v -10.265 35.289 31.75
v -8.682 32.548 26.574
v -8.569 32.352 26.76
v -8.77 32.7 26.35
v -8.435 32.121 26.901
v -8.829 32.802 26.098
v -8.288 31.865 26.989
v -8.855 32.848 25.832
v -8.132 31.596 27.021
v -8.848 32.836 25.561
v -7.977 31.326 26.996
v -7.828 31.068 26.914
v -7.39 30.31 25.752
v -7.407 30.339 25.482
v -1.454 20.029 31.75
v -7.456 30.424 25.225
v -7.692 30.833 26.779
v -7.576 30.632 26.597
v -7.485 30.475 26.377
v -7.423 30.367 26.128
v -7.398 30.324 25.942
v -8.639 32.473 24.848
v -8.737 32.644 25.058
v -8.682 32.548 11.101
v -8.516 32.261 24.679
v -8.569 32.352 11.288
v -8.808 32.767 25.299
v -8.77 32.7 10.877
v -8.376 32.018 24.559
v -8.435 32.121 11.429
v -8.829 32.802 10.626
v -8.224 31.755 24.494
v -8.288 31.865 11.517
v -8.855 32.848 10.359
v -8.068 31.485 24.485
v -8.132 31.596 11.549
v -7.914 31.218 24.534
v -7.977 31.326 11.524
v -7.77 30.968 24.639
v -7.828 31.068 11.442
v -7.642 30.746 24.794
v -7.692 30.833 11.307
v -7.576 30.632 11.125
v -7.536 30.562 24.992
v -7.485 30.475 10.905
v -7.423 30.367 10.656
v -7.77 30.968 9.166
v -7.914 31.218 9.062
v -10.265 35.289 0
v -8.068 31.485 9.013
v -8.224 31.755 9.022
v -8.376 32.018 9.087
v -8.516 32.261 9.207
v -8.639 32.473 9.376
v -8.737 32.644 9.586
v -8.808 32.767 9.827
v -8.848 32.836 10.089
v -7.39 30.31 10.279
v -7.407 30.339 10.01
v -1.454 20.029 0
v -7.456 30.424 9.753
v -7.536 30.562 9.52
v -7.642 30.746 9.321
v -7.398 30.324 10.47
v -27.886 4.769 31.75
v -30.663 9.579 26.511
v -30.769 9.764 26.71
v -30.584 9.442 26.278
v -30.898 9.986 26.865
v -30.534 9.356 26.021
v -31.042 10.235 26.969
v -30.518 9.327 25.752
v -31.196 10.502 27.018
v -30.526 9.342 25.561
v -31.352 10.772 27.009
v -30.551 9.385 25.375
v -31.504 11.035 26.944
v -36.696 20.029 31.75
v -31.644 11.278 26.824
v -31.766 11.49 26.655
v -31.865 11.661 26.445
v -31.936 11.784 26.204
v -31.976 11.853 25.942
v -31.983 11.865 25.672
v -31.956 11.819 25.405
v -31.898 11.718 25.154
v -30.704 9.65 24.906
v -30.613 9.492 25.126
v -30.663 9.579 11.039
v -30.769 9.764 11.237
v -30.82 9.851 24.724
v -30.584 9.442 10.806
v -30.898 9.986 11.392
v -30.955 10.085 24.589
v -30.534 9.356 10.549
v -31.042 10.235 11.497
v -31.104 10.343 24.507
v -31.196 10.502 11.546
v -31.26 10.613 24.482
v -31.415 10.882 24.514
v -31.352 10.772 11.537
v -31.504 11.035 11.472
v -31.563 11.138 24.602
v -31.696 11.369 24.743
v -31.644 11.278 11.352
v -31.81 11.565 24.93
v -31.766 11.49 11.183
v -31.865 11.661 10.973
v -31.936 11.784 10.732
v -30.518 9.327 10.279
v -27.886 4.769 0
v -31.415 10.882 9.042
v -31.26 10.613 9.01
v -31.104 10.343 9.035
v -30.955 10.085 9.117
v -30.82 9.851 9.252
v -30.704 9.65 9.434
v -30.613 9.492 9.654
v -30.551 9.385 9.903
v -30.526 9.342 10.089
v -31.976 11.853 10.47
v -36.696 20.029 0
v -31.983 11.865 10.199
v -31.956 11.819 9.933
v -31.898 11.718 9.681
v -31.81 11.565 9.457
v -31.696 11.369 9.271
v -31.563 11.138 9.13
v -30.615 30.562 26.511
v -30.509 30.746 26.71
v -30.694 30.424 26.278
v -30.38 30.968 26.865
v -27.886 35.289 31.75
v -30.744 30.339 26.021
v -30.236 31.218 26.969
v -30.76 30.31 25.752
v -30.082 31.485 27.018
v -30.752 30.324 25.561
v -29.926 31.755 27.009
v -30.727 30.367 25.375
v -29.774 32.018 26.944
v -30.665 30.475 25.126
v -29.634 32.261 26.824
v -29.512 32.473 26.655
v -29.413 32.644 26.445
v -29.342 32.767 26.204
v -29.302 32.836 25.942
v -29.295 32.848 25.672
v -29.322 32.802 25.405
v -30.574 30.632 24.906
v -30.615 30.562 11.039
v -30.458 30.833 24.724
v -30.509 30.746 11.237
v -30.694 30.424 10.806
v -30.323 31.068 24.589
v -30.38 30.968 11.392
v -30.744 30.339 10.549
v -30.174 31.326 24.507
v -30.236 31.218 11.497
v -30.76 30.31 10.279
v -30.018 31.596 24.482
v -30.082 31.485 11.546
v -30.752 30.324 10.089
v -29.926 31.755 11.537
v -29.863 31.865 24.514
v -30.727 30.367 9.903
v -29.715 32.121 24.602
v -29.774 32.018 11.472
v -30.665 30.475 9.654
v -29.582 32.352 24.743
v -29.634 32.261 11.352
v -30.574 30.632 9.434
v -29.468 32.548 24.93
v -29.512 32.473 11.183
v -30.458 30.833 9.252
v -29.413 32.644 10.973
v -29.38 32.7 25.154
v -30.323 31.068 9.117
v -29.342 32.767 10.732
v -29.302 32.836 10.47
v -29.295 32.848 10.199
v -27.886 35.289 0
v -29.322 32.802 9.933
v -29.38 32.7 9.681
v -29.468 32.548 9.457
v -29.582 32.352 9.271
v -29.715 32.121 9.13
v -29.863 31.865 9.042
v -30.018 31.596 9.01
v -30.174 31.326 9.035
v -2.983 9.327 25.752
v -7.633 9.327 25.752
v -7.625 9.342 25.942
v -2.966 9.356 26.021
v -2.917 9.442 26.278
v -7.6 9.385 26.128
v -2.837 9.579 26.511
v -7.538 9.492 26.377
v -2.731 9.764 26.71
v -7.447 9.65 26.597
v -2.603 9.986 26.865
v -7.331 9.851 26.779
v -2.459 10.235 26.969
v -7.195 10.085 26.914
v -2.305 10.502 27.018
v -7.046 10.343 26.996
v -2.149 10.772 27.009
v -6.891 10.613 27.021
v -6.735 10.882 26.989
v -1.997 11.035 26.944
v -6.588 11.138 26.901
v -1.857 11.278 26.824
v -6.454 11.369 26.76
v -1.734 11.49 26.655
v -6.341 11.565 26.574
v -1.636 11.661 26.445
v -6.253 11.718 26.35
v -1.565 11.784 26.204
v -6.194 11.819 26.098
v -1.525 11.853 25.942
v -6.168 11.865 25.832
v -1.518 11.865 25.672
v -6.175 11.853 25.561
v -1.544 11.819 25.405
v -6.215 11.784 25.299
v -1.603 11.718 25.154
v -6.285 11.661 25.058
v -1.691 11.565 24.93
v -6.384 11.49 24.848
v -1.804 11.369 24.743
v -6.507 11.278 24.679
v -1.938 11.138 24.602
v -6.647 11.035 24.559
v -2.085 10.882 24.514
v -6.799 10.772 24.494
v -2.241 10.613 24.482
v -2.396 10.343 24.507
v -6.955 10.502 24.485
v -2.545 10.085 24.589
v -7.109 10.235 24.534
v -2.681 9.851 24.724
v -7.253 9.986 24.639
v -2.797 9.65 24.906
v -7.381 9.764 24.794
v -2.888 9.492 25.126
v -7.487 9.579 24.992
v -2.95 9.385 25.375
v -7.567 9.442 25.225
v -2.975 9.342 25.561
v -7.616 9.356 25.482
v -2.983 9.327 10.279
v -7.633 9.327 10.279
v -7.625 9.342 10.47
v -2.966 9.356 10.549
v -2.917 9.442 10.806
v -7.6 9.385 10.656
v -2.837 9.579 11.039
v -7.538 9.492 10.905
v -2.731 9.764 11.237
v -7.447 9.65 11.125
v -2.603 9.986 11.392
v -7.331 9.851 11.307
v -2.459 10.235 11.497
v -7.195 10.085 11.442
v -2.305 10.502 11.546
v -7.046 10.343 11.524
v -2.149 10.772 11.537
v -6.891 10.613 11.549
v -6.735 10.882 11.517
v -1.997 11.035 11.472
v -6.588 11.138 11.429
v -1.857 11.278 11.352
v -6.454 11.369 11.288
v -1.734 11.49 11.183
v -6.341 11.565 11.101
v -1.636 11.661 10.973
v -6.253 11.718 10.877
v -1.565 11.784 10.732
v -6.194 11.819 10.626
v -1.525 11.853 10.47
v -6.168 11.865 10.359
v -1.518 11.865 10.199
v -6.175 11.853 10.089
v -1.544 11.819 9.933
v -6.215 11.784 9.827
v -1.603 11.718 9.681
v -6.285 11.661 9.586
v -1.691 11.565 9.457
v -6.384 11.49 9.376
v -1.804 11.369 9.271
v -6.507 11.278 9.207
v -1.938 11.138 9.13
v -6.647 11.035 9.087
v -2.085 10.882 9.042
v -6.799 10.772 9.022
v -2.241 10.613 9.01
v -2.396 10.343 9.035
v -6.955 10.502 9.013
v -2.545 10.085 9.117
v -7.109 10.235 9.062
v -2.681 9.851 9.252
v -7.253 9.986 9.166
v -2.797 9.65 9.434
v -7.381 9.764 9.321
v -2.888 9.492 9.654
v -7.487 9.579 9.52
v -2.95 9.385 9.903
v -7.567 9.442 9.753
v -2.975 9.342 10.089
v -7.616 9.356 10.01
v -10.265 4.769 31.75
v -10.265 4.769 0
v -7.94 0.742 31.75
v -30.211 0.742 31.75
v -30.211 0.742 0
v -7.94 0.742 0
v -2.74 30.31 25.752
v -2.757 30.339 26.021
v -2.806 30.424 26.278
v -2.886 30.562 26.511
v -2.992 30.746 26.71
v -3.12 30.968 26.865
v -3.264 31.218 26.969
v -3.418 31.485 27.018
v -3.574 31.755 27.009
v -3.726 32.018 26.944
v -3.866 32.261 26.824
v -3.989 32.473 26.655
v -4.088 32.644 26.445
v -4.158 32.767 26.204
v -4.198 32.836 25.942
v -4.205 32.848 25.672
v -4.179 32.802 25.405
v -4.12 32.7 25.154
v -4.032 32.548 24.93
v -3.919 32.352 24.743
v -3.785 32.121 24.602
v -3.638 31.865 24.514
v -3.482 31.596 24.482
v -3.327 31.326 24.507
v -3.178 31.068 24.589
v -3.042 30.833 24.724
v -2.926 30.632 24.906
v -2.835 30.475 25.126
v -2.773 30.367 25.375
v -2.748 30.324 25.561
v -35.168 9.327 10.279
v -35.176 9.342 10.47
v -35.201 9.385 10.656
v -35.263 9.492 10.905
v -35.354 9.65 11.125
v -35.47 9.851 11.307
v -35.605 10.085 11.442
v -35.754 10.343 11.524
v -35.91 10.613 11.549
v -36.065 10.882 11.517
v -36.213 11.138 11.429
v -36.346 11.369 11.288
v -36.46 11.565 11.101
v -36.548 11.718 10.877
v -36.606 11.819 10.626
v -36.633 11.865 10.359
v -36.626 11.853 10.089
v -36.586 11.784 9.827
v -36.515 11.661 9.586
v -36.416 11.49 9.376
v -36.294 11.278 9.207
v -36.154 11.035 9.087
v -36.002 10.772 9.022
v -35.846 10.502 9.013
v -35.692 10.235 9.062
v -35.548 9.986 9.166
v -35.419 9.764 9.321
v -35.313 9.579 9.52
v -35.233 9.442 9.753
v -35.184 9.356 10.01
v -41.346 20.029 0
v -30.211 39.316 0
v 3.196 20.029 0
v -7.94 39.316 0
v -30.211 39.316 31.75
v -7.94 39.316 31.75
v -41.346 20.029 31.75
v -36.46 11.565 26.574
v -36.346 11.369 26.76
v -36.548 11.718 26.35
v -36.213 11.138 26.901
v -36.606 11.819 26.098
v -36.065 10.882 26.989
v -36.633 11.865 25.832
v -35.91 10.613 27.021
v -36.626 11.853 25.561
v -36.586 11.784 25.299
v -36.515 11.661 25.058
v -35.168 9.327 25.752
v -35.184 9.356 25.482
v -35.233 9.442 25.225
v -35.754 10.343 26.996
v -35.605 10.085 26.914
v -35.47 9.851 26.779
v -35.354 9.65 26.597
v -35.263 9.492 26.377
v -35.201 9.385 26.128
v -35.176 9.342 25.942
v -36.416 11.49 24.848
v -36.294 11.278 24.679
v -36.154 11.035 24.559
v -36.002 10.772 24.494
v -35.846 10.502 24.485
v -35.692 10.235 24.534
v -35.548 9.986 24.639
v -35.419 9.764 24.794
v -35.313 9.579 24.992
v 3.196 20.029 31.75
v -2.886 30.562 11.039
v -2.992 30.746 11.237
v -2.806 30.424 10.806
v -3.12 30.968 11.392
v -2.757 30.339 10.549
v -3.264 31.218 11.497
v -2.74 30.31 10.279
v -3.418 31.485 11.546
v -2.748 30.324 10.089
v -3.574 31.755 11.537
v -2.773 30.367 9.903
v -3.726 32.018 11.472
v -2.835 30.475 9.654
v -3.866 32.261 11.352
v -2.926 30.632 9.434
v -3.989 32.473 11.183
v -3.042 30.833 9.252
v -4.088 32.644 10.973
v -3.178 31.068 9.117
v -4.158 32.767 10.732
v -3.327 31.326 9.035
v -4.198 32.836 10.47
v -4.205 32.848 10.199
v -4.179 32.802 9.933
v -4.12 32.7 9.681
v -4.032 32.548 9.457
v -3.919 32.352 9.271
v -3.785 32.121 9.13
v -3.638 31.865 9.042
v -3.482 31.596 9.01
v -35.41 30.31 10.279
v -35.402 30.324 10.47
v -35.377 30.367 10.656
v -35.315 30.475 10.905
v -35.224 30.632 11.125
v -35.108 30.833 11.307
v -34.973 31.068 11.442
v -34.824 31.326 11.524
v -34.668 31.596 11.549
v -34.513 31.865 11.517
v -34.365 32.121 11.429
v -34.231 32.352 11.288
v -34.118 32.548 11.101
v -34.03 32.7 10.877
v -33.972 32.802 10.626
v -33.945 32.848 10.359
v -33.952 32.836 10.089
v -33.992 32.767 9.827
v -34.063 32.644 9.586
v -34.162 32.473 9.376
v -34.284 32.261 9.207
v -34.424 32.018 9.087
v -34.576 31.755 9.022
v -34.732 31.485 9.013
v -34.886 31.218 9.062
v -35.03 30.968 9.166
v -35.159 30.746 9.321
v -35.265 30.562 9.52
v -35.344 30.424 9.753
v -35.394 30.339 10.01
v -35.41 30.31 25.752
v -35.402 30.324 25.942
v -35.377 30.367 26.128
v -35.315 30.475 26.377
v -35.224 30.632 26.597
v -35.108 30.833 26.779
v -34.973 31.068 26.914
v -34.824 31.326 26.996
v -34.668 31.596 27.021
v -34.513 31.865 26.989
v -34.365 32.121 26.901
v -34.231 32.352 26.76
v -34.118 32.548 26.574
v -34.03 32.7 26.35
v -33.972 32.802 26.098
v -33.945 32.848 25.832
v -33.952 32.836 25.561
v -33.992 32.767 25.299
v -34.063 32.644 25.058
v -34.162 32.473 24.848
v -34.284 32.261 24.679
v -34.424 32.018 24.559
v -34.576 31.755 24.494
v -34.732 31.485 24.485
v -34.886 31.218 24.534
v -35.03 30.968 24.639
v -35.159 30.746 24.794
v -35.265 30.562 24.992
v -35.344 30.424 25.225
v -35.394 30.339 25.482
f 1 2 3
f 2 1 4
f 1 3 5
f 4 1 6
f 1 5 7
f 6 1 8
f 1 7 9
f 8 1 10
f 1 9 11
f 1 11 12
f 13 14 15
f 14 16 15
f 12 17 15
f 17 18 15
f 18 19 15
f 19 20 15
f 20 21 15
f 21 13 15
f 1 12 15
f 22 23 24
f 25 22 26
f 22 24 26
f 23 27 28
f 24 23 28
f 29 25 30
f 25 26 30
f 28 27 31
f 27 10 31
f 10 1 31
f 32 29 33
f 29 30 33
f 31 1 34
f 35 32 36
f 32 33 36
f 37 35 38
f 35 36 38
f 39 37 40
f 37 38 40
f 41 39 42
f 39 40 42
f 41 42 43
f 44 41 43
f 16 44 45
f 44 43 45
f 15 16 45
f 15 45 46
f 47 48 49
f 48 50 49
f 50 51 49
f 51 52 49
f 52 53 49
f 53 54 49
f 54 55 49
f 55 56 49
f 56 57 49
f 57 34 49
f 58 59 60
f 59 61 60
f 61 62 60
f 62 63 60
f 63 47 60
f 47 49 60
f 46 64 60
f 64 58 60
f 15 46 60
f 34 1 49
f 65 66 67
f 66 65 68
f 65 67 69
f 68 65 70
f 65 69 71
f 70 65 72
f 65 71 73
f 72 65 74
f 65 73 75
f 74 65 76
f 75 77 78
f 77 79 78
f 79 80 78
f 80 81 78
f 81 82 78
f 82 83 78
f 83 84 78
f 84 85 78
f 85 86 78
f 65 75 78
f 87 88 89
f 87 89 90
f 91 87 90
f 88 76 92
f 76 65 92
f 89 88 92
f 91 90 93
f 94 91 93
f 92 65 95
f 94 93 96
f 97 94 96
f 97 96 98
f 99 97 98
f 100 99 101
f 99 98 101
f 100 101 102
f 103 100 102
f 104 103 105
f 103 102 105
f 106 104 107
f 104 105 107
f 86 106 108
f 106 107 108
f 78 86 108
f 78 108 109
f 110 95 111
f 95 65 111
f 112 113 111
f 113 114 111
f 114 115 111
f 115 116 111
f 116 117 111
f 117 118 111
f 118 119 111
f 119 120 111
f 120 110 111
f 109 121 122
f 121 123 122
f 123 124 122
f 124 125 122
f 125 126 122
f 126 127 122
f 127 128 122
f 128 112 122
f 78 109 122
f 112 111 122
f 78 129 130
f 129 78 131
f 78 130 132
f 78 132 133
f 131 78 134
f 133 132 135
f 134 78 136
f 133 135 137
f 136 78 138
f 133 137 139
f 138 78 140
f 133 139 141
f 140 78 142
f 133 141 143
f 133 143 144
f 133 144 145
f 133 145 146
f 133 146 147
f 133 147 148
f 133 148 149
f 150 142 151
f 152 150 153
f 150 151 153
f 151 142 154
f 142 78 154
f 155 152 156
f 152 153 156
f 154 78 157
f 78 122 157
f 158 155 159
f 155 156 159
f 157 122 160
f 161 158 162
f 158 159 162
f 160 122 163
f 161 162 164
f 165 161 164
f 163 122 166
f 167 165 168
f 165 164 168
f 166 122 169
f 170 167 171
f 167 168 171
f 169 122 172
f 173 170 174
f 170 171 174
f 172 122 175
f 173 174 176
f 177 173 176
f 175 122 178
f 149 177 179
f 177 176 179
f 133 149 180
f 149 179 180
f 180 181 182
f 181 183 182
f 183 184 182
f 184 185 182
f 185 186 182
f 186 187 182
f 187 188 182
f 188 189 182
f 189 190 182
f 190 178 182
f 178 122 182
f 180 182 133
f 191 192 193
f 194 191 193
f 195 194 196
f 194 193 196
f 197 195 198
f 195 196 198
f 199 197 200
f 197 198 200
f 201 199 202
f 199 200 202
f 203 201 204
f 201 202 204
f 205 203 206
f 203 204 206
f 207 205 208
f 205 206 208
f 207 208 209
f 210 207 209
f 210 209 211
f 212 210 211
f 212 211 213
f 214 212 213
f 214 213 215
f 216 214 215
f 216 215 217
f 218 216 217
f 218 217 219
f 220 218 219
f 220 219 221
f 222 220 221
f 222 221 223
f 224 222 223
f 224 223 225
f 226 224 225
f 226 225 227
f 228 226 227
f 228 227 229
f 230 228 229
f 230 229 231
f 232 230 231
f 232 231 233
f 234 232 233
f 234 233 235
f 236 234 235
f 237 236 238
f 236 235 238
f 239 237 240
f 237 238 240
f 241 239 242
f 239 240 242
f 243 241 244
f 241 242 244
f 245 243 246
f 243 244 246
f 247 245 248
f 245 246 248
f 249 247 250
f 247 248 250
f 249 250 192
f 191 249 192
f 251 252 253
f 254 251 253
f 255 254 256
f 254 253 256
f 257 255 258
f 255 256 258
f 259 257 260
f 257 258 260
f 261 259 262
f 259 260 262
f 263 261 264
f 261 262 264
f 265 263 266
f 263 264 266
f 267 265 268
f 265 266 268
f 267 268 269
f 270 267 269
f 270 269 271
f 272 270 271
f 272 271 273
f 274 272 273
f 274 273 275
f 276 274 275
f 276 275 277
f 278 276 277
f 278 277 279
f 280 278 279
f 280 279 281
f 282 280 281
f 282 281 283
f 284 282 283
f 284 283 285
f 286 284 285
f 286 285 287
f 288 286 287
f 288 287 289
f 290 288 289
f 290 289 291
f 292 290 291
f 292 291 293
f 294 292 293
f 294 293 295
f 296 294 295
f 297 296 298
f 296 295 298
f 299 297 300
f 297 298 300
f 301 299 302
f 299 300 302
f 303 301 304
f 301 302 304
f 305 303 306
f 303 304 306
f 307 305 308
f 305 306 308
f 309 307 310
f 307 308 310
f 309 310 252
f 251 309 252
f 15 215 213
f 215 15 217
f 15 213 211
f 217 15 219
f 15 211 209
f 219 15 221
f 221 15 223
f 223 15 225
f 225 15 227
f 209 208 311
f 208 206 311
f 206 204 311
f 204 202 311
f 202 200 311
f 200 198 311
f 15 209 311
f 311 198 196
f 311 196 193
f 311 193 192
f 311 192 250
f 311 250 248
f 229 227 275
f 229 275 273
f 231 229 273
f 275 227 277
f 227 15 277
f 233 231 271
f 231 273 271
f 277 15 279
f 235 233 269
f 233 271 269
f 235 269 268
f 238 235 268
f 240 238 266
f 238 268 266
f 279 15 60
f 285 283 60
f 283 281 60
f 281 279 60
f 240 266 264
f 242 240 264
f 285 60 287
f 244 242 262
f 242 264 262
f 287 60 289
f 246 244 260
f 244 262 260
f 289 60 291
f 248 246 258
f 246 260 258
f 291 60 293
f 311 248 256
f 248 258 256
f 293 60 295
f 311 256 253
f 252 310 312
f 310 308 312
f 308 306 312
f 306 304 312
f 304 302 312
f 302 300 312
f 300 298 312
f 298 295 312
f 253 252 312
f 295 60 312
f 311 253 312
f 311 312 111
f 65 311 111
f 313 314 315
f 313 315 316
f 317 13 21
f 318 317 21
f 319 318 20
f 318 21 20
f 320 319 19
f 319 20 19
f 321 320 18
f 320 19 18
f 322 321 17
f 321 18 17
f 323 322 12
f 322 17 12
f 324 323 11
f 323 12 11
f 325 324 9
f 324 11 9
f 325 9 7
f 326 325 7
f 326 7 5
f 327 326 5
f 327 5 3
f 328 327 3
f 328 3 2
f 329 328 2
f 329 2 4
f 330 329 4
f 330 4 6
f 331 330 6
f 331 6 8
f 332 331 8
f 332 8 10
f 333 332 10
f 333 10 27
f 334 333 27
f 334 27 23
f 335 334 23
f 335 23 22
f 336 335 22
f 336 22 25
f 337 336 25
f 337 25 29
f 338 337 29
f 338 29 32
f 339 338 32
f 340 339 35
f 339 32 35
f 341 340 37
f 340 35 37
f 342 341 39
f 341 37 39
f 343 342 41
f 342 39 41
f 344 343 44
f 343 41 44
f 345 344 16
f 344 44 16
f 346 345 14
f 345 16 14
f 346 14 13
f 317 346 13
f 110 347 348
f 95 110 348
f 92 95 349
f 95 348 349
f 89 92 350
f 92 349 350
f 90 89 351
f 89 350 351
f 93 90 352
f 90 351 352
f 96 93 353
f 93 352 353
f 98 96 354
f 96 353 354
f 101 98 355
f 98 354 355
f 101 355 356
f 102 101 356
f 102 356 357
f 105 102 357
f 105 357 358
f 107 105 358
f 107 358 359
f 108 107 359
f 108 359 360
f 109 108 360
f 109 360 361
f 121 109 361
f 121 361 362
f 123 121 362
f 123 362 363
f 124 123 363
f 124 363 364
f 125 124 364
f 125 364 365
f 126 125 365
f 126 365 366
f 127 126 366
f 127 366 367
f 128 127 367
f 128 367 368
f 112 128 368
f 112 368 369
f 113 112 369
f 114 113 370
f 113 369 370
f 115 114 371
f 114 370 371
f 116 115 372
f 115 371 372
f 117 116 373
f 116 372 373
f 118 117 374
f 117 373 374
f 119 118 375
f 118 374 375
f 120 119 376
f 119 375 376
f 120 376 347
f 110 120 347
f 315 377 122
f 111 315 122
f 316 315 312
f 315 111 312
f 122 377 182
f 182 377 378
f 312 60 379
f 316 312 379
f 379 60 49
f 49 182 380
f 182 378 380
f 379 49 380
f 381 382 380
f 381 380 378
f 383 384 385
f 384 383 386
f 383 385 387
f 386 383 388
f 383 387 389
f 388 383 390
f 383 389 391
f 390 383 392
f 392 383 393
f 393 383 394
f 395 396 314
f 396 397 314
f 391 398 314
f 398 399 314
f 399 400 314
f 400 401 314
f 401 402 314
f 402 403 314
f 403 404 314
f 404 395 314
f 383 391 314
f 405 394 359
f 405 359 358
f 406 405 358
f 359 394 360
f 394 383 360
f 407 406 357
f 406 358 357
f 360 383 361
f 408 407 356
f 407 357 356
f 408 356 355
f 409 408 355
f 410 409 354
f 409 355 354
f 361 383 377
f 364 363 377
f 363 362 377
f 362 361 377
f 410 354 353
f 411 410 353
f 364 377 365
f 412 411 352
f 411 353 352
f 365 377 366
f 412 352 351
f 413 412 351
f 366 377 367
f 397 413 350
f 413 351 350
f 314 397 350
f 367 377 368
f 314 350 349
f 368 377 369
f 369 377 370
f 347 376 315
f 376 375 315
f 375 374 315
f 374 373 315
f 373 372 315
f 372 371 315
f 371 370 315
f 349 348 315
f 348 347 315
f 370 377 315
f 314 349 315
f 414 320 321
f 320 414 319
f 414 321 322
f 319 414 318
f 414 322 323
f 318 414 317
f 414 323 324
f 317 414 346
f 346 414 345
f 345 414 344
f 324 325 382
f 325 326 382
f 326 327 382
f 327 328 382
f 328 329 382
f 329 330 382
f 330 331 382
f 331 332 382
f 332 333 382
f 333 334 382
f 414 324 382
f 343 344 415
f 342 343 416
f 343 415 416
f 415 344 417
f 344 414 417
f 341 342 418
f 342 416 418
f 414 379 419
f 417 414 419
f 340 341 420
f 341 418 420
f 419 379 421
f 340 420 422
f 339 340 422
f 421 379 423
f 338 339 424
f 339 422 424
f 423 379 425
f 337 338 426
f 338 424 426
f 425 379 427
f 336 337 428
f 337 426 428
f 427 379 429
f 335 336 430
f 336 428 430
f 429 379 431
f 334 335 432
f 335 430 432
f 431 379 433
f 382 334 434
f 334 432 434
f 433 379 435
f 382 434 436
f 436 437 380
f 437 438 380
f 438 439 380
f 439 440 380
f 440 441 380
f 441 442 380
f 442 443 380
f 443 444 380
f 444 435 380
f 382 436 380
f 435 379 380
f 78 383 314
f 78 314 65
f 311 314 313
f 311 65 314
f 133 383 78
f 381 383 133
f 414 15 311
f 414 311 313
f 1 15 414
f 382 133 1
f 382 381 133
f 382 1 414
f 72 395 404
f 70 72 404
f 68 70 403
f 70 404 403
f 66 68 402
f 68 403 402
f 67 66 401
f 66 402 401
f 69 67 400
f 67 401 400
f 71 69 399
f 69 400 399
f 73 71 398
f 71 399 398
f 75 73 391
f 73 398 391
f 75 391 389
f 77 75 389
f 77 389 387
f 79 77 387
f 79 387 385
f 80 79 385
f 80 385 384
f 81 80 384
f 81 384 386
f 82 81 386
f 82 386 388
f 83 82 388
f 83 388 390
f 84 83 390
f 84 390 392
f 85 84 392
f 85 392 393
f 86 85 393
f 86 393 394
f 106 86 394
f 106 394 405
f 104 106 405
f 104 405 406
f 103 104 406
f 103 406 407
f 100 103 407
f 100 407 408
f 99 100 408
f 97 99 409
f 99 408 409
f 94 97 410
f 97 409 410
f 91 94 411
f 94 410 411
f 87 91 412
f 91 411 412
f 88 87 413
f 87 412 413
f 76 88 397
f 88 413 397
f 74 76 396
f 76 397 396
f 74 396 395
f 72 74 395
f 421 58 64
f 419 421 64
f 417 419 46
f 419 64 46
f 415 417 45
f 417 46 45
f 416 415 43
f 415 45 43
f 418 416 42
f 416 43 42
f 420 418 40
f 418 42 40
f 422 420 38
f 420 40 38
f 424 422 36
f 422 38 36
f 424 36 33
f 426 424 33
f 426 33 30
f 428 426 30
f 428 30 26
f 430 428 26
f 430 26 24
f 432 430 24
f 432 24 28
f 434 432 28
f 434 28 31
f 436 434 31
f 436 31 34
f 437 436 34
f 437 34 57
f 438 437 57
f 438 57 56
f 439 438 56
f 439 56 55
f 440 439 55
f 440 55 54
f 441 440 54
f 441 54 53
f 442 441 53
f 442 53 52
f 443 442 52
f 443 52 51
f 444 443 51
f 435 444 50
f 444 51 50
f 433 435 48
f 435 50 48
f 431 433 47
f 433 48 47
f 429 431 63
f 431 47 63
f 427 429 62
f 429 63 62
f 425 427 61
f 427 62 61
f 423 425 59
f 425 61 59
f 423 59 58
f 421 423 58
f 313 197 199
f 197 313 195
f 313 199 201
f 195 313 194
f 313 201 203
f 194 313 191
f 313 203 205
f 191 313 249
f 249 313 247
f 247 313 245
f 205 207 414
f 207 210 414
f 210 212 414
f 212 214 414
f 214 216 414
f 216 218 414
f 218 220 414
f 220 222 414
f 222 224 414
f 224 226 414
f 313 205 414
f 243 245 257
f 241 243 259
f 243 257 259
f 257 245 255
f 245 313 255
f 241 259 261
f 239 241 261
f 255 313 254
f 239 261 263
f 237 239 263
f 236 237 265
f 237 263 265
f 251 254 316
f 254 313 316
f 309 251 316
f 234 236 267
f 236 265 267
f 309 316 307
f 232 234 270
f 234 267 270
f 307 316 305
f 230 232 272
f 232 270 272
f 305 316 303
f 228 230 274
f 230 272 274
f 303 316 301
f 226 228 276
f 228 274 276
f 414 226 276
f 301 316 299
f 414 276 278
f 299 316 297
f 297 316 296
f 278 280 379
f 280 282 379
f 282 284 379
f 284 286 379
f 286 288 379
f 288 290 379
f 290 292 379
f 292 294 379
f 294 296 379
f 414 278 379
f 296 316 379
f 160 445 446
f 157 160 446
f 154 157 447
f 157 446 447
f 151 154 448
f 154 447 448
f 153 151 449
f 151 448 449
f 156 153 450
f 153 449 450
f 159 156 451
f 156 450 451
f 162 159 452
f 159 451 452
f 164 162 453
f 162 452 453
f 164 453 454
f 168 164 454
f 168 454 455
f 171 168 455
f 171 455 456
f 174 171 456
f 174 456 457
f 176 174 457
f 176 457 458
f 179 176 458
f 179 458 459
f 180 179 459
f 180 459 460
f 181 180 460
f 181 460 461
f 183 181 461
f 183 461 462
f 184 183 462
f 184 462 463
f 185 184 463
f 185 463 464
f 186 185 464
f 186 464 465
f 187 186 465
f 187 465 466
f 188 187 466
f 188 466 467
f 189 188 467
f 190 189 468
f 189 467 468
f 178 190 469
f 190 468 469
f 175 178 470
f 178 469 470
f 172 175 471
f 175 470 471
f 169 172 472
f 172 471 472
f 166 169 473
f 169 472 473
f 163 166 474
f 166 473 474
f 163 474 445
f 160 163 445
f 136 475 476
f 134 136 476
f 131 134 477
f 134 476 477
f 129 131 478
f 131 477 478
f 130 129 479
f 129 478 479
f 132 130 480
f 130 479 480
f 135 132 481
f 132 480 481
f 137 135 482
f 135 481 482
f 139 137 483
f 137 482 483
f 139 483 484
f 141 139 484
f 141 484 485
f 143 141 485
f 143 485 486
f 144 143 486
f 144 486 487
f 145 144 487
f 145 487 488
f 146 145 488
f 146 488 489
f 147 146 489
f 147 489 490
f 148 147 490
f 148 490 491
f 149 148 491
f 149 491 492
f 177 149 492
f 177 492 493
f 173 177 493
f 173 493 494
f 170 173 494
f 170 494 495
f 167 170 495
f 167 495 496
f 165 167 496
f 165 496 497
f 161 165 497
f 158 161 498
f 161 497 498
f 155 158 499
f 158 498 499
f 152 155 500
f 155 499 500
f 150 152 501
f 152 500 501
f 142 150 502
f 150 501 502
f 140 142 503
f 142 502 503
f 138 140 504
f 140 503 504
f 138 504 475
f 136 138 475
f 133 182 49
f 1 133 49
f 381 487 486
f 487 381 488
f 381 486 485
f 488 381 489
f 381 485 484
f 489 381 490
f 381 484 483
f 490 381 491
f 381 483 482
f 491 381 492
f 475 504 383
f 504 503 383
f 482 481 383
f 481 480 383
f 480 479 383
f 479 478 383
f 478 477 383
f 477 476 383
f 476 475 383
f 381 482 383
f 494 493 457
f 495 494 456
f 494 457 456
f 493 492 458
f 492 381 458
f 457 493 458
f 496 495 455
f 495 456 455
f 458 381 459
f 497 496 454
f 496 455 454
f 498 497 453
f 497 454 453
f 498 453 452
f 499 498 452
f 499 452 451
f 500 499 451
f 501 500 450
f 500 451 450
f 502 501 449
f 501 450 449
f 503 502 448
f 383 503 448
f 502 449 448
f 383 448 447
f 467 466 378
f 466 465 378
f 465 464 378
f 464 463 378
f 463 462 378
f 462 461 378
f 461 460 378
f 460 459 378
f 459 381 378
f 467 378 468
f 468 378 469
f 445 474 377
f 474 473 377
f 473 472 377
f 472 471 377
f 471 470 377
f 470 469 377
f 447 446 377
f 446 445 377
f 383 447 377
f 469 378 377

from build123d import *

# Parameters (mm, degrees)
F1_DEPTH = 31.75
F3_D     = 2.54


with BuildPart() as f1:
    # F0 (on Top) → F1 (new body)
    with BuildSketch(Plane.XY):
        Polygon((-7.939773, 39.316174), (-30.21069, 39.316174), (-41.346149, 20.028993), (-30.21069, 0.741813), (-7.939773, 0.741813), (3.195686, 20.028993), align=None)
        Polygon((-36.696177, 20.028993), (-27.885704, 35.28918), (-10.264759, 35.28918), (-1.454287, 20.028993), (-10.264759, 4.768807), (-27.885704, 4.768807), align=None, mode=Mode.SUBTRACT)
    extrude(amount=F1_DEPTH)

    # F3 (through all)
    with Locations(Plane.YZ):
        with Locations((10.597352, 25.751563), (31.580105, 25.751563), (31.580105, 10.279431), (10.597352, 10.279431)):
            Hole(F3_D / 2)


solid = f1.part
